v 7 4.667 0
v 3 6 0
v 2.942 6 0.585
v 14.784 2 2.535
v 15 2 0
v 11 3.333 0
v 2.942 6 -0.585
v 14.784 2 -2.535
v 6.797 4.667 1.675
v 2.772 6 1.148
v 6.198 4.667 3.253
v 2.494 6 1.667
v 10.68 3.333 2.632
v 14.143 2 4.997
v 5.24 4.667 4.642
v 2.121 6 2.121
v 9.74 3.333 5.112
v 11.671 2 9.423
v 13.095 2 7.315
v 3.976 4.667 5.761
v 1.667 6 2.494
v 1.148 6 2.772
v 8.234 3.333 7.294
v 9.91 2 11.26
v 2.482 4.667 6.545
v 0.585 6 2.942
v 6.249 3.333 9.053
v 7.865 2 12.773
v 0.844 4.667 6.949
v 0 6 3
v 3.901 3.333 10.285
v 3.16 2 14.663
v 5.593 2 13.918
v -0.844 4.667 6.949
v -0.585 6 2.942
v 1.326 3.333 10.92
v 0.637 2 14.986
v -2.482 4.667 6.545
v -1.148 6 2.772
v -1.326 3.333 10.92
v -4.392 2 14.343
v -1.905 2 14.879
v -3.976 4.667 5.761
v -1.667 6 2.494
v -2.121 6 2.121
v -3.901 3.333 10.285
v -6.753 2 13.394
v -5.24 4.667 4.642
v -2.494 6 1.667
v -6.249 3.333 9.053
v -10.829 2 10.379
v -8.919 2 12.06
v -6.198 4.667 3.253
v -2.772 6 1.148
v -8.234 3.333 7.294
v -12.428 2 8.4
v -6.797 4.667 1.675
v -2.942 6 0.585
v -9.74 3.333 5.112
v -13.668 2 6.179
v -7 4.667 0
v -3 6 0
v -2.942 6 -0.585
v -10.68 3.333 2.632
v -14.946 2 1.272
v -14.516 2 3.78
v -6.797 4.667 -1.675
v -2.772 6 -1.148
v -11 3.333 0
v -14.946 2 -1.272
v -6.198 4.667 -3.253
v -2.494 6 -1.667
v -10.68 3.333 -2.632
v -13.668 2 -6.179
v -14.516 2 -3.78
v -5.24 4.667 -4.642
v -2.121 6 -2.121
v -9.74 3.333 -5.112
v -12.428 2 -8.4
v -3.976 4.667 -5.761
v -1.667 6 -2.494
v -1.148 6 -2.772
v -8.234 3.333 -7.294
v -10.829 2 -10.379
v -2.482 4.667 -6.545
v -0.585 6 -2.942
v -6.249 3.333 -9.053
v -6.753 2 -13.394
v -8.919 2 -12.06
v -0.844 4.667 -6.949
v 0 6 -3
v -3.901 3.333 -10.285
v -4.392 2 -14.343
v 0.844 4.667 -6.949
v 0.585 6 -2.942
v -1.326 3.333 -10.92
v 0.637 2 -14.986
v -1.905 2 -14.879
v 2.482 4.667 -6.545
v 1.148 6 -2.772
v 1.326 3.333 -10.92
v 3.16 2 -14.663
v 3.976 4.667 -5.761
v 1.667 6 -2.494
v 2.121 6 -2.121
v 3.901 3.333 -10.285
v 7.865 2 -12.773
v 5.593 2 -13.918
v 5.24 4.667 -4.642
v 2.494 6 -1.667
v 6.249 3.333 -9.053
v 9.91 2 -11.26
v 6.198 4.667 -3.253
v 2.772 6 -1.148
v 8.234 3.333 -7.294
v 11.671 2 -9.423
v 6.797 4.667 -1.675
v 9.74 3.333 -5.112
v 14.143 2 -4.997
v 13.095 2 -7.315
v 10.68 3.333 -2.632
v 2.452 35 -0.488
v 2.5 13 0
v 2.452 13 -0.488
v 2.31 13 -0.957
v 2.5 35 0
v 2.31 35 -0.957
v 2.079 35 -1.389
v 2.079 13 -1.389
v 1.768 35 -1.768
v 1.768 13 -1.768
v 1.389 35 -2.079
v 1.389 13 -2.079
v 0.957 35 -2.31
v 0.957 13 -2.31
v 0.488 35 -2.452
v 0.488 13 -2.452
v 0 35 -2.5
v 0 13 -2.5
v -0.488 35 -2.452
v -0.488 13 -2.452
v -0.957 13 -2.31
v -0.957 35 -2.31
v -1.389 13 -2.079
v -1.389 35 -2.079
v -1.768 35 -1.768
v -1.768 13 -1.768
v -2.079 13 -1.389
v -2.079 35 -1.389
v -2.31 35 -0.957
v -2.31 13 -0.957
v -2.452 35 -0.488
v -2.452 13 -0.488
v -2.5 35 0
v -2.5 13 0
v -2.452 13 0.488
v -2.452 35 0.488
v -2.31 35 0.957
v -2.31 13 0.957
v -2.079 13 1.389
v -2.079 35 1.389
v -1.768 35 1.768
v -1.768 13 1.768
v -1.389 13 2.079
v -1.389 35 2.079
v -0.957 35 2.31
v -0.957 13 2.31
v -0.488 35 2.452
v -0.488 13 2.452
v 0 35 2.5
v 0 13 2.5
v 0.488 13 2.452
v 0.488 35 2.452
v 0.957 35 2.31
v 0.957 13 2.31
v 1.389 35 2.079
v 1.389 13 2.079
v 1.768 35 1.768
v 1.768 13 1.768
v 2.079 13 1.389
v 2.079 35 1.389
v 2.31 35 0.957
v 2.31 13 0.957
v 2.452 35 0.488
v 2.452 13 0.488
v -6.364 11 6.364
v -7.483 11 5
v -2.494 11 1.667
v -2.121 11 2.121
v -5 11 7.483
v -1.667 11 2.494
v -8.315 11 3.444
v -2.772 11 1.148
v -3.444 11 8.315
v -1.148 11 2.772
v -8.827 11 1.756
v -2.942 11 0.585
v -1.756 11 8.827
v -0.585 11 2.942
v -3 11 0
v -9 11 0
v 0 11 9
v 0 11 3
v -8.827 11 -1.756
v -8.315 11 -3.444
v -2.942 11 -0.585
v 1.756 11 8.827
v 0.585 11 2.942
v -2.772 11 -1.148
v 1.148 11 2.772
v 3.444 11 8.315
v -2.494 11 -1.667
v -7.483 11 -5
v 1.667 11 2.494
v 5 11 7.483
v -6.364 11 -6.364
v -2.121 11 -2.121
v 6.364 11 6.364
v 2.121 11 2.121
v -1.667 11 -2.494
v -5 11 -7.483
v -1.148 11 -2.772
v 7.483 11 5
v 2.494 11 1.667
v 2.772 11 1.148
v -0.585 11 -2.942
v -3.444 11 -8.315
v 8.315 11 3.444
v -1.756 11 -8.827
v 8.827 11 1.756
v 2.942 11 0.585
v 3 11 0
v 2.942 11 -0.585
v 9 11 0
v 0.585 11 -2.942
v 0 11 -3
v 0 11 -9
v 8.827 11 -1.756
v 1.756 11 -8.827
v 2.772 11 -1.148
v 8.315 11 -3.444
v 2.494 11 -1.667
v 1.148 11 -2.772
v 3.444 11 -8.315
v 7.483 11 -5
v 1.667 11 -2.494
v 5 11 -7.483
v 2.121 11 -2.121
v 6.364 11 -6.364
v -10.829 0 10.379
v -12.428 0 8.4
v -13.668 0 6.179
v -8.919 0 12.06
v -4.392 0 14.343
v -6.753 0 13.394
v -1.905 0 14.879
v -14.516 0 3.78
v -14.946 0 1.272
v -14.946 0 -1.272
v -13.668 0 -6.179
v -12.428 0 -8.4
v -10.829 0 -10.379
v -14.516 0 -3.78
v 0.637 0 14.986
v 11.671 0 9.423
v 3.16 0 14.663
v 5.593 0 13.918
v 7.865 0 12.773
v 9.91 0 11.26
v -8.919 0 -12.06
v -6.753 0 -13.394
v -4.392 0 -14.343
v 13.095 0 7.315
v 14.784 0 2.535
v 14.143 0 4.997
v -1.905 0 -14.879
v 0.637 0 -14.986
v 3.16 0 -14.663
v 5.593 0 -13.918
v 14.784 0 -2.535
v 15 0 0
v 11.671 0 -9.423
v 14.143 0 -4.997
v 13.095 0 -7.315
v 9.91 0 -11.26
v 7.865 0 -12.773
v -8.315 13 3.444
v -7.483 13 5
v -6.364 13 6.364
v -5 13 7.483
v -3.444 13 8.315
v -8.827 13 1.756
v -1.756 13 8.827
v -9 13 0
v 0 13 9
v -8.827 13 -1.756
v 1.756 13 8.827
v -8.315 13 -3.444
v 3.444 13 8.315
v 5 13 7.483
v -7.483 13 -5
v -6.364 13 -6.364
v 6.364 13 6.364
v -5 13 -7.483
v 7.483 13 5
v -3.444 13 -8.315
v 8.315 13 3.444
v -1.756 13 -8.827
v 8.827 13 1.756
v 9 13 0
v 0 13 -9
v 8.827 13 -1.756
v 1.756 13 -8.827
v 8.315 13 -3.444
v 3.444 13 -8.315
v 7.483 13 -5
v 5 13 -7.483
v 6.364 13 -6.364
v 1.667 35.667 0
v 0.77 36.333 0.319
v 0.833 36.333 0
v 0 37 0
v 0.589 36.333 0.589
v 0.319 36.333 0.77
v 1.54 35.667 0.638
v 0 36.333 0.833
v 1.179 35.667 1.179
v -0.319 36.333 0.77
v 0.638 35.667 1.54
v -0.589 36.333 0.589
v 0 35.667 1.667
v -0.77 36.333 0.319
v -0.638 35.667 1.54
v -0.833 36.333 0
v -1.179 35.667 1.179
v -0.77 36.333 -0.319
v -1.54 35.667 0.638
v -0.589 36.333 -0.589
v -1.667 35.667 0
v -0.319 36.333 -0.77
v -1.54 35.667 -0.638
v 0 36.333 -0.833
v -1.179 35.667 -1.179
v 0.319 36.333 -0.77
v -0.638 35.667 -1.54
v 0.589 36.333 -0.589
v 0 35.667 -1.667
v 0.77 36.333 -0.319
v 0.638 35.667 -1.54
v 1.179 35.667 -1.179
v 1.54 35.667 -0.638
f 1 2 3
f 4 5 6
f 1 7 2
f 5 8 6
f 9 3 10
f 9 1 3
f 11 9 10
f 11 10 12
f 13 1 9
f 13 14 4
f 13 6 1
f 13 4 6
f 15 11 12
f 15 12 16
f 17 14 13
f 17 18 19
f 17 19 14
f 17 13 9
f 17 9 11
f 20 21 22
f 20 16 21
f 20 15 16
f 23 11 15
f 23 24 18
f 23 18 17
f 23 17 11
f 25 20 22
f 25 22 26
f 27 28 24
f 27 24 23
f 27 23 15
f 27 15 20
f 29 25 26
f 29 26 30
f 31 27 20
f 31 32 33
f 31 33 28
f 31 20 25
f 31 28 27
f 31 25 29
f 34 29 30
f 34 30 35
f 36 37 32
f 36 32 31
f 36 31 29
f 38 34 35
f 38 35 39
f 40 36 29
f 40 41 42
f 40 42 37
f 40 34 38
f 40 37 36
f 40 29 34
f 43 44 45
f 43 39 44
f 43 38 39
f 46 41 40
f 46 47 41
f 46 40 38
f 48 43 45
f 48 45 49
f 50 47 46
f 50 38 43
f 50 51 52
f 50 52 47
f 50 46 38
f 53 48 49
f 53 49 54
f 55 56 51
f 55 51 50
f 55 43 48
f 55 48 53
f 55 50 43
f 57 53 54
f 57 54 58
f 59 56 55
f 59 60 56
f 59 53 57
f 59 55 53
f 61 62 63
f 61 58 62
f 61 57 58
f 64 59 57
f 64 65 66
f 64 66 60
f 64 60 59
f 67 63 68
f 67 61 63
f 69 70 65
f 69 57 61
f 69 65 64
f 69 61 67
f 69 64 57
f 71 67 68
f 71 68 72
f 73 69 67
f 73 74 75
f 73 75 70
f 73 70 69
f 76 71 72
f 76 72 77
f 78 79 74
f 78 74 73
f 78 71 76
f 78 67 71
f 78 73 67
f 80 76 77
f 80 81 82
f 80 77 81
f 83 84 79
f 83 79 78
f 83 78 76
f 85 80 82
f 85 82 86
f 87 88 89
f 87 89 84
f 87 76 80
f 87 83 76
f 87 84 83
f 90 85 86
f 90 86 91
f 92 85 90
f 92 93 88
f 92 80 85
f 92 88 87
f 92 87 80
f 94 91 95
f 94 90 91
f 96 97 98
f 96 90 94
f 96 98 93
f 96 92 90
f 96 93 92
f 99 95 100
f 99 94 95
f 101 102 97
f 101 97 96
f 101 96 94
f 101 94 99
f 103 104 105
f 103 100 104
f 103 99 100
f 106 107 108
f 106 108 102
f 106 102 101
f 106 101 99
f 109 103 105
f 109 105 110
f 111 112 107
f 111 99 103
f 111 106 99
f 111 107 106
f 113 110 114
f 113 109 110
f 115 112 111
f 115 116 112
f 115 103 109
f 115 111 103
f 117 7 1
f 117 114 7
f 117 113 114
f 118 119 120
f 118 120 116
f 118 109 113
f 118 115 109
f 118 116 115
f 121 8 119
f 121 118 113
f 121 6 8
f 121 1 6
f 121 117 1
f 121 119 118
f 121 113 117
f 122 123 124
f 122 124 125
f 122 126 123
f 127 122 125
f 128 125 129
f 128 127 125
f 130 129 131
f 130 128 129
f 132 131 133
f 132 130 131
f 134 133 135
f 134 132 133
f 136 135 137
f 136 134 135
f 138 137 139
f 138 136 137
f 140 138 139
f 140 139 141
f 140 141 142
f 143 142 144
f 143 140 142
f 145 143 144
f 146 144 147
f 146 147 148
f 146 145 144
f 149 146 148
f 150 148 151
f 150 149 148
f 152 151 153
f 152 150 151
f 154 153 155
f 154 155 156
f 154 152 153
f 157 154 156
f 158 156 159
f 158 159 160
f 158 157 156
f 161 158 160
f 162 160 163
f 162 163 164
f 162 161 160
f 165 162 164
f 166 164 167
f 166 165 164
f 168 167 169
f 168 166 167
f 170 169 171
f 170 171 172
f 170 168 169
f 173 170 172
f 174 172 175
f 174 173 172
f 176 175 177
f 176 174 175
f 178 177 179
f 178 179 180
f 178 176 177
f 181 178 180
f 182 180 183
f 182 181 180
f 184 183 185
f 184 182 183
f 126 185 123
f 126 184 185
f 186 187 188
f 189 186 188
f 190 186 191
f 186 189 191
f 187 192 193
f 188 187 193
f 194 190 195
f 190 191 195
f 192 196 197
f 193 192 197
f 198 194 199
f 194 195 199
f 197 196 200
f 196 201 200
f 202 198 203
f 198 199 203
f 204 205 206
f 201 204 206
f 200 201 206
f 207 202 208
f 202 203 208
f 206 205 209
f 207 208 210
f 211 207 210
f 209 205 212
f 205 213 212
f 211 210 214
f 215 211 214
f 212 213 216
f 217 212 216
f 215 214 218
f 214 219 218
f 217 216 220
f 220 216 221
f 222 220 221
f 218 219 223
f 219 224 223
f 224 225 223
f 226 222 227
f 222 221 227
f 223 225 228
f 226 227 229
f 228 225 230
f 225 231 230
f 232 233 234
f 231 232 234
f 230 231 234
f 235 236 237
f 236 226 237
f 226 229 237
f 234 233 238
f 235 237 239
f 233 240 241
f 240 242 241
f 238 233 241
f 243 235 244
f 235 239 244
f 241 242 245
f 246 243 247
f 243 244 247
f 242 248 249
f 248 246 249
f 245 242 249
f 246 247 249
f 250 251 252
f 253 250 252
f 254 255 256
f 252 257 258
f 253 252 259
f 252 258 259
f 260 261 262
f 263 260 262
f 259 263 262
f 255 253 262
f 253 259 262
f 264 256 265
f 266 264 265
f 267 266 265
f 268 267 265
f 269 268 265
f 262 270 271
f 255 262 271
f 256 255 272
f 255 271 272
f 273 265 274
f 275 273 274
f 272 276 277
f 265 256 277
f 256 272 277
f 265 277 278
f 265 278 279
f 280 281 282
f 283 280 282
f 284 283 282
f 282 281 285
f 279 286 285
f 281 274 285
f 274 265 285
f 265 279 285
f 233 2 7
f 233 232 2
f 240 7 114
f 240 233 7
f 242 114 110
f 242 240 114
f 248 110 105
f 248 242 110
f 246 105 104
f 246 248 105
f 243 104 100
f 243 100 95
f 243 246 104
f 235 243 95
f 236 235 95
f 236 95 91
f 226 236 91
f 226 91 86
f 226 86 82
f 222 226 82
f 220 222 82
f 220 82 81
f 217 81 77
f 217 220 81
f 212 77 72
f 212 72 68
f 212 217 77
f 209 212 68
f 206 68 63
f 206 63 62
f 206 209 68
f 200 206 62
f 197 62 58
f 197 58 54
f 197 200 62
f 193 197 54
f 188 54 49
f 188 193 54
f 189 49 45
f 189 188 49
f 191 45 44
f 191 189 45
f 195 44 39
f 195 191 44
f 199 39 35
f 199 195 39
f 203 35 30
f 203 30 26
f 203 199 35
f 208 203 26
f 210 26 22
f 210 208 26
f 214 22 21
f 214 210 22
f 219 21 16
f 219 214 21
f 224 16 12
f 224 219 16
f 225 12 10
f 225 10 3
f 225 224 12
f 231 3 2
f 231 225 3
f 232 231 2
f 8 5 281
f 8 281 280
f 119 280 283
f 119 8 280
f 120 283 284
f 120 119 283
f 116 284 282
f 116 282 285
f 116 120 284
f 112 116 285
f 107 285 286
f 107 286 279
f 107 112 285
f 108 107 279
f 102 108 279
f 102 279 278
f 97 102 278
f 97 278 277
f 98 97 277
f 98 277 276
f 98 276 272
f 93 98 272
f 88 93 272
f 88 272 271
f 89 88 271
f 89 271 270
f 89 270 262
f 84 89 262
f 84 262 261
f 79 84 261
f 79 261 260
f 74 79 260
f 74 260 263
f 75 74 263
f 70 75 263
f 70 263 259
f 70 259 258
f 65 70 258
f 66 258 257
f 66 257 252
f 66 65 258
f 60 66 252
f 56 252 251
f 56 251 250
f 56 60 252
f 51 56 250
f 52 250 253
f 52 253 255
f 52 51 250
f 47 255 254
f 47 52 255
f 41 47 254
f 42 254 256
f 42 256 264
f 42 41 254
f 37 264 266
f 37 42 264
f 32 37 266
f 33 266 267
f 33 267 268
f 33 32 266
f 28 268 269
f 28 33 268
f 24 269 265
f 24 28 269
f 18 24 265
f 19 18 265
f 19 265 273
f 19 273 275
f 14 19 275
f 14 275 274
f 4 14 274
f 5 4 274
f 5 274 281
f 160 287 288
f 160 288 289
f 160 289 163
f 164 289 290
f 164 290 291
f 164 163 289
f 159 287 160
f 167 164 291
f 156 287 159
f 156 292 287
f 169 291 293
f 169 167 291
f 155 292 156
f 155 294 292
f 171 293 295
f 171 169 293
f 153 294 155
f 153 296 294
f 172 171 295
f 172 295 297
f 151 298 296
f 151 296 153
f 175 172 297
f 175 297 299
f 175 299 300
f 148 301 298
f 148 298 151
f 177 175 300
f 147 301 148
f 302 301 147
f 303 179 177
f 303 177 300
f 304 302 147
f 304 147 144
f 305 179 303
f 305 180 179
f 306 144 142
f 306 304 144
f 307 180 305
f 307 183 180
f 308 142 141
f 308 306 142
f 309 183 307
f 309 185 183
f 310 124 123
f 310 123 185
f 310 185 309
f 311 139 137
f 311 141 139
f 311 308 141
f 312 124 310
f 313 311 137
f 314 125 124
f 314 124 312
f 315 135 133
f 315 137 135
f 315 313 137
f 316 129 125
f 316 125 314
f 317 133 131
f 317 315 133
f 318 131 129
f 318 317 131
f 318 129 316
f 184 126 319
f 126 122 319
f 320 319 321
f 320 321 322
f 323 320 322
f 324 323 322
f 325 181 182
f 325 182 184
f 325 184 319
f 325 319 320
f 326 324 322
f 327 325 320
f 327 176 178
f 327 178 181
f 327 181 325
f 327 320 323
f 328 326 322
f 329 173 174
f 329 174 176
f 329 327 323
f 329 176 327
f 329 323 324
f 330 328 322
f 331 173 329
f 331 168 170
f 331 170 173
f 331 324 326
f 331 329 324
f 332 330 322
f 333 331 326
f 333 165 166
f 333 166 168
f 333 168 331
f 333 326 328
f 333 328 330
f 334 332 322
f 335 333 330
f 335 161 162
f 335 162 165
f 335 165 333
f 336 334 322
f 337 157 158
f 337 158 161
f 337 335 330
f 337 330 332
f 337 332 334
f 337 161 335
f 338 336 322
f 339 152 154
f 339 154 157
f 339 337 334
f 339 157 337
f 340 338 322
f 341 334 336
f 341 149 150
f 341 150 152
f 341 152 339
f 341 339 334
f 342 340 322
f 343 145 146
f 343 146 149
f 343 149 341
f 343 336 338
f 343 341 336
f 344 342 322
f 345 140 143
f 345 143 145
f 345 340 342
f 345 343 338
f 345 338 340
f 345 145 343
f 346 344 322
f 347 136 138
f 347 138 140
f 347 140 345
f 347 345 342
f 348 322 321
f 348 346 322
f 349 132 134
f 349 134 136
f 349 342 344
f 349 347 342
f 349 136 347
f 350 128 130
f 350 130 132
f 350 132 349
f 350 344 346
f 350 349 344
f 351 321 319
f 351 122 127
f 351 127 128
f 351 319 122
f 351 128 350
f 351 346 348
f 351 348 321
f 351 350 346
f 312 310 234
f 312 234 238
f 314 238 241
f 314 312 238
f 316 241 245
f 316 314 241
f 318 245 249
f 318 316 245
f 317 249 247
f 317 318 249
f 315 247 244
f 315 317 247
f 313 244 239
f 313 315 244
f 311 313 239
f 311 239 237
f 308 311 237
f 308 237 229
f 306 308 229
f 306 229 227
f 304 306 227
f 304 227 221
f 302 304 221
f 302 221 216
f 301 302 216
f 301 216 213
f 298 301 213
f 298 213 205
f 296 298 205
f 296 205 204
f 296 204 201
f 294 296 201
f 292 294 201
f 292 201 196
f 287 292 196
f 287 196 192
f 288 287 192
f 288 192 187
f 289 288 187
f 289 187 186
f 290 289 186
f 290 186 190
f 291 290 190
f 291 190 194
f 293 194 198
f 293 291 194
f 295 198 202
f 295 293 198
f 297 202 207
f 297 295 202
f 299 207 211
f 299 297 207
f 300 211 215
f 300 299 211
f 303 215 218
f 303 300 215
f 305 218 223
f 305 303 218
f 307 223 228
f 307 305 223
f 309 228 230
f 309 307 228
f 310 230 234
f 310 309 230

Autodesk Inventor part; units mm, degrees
ref_plane "YZ Plane" through (0, 0, 0) normal (1, 0, 0) x (0, 1, 0)
ref_plane "XZ Plane" through (0, 0, 0) normal (0, 1, 0) x (-1, 0, 0)
ref_plane "XY Plane" through (0, 0, 0) normal (0, 0, 1) x (1, 0, 0)
sketch "Skizze3" plane through (0, 0, 0) normal (0, 0, 1) x (1, 0, 0)
  line L0 (0, 0) -> (15, 0)
  line L1 (15, 0) -> (15, 2)
  line L2 (15, 2) -> (3, 6)
  line L3 (3, 6) -> (3, 11)
  line L4 (3, 11) -> (9, 11)
  line L5 (9, 11) -> (9, 13)
  line L6 (9, 13) -> (2.5, 13)
  line L7 (2.5, 13) -> (2.5, 35)
  line L8 (2.5, 35) -> (0, 37)
  line L9 (0, -1.3947) -> (0, 46.3421)
  dimension "d4" = 18
  dimension "d5" = 6
  dimension "d6" = 2
  dimension "d7" = 5
  dimension "d8" = 2
  dimension "d9" = 6
  dimension "d11" = 5
  dimension "d12" = 30
  dimension "d13" = 35
  dimension "d14" = 2
revolve "Umdrehung1" add sketch "Skizze3" angle 360 about axis through (0, -1.3947, 0) along (0, 1, 0)
thread "Gewinde1" size "M5x0.8" class "6g" standard "ISO Metric profile" full length
properties part number "BT002_trajan20_22" material "Kunststoff, undurchsichtig Schwarz"
